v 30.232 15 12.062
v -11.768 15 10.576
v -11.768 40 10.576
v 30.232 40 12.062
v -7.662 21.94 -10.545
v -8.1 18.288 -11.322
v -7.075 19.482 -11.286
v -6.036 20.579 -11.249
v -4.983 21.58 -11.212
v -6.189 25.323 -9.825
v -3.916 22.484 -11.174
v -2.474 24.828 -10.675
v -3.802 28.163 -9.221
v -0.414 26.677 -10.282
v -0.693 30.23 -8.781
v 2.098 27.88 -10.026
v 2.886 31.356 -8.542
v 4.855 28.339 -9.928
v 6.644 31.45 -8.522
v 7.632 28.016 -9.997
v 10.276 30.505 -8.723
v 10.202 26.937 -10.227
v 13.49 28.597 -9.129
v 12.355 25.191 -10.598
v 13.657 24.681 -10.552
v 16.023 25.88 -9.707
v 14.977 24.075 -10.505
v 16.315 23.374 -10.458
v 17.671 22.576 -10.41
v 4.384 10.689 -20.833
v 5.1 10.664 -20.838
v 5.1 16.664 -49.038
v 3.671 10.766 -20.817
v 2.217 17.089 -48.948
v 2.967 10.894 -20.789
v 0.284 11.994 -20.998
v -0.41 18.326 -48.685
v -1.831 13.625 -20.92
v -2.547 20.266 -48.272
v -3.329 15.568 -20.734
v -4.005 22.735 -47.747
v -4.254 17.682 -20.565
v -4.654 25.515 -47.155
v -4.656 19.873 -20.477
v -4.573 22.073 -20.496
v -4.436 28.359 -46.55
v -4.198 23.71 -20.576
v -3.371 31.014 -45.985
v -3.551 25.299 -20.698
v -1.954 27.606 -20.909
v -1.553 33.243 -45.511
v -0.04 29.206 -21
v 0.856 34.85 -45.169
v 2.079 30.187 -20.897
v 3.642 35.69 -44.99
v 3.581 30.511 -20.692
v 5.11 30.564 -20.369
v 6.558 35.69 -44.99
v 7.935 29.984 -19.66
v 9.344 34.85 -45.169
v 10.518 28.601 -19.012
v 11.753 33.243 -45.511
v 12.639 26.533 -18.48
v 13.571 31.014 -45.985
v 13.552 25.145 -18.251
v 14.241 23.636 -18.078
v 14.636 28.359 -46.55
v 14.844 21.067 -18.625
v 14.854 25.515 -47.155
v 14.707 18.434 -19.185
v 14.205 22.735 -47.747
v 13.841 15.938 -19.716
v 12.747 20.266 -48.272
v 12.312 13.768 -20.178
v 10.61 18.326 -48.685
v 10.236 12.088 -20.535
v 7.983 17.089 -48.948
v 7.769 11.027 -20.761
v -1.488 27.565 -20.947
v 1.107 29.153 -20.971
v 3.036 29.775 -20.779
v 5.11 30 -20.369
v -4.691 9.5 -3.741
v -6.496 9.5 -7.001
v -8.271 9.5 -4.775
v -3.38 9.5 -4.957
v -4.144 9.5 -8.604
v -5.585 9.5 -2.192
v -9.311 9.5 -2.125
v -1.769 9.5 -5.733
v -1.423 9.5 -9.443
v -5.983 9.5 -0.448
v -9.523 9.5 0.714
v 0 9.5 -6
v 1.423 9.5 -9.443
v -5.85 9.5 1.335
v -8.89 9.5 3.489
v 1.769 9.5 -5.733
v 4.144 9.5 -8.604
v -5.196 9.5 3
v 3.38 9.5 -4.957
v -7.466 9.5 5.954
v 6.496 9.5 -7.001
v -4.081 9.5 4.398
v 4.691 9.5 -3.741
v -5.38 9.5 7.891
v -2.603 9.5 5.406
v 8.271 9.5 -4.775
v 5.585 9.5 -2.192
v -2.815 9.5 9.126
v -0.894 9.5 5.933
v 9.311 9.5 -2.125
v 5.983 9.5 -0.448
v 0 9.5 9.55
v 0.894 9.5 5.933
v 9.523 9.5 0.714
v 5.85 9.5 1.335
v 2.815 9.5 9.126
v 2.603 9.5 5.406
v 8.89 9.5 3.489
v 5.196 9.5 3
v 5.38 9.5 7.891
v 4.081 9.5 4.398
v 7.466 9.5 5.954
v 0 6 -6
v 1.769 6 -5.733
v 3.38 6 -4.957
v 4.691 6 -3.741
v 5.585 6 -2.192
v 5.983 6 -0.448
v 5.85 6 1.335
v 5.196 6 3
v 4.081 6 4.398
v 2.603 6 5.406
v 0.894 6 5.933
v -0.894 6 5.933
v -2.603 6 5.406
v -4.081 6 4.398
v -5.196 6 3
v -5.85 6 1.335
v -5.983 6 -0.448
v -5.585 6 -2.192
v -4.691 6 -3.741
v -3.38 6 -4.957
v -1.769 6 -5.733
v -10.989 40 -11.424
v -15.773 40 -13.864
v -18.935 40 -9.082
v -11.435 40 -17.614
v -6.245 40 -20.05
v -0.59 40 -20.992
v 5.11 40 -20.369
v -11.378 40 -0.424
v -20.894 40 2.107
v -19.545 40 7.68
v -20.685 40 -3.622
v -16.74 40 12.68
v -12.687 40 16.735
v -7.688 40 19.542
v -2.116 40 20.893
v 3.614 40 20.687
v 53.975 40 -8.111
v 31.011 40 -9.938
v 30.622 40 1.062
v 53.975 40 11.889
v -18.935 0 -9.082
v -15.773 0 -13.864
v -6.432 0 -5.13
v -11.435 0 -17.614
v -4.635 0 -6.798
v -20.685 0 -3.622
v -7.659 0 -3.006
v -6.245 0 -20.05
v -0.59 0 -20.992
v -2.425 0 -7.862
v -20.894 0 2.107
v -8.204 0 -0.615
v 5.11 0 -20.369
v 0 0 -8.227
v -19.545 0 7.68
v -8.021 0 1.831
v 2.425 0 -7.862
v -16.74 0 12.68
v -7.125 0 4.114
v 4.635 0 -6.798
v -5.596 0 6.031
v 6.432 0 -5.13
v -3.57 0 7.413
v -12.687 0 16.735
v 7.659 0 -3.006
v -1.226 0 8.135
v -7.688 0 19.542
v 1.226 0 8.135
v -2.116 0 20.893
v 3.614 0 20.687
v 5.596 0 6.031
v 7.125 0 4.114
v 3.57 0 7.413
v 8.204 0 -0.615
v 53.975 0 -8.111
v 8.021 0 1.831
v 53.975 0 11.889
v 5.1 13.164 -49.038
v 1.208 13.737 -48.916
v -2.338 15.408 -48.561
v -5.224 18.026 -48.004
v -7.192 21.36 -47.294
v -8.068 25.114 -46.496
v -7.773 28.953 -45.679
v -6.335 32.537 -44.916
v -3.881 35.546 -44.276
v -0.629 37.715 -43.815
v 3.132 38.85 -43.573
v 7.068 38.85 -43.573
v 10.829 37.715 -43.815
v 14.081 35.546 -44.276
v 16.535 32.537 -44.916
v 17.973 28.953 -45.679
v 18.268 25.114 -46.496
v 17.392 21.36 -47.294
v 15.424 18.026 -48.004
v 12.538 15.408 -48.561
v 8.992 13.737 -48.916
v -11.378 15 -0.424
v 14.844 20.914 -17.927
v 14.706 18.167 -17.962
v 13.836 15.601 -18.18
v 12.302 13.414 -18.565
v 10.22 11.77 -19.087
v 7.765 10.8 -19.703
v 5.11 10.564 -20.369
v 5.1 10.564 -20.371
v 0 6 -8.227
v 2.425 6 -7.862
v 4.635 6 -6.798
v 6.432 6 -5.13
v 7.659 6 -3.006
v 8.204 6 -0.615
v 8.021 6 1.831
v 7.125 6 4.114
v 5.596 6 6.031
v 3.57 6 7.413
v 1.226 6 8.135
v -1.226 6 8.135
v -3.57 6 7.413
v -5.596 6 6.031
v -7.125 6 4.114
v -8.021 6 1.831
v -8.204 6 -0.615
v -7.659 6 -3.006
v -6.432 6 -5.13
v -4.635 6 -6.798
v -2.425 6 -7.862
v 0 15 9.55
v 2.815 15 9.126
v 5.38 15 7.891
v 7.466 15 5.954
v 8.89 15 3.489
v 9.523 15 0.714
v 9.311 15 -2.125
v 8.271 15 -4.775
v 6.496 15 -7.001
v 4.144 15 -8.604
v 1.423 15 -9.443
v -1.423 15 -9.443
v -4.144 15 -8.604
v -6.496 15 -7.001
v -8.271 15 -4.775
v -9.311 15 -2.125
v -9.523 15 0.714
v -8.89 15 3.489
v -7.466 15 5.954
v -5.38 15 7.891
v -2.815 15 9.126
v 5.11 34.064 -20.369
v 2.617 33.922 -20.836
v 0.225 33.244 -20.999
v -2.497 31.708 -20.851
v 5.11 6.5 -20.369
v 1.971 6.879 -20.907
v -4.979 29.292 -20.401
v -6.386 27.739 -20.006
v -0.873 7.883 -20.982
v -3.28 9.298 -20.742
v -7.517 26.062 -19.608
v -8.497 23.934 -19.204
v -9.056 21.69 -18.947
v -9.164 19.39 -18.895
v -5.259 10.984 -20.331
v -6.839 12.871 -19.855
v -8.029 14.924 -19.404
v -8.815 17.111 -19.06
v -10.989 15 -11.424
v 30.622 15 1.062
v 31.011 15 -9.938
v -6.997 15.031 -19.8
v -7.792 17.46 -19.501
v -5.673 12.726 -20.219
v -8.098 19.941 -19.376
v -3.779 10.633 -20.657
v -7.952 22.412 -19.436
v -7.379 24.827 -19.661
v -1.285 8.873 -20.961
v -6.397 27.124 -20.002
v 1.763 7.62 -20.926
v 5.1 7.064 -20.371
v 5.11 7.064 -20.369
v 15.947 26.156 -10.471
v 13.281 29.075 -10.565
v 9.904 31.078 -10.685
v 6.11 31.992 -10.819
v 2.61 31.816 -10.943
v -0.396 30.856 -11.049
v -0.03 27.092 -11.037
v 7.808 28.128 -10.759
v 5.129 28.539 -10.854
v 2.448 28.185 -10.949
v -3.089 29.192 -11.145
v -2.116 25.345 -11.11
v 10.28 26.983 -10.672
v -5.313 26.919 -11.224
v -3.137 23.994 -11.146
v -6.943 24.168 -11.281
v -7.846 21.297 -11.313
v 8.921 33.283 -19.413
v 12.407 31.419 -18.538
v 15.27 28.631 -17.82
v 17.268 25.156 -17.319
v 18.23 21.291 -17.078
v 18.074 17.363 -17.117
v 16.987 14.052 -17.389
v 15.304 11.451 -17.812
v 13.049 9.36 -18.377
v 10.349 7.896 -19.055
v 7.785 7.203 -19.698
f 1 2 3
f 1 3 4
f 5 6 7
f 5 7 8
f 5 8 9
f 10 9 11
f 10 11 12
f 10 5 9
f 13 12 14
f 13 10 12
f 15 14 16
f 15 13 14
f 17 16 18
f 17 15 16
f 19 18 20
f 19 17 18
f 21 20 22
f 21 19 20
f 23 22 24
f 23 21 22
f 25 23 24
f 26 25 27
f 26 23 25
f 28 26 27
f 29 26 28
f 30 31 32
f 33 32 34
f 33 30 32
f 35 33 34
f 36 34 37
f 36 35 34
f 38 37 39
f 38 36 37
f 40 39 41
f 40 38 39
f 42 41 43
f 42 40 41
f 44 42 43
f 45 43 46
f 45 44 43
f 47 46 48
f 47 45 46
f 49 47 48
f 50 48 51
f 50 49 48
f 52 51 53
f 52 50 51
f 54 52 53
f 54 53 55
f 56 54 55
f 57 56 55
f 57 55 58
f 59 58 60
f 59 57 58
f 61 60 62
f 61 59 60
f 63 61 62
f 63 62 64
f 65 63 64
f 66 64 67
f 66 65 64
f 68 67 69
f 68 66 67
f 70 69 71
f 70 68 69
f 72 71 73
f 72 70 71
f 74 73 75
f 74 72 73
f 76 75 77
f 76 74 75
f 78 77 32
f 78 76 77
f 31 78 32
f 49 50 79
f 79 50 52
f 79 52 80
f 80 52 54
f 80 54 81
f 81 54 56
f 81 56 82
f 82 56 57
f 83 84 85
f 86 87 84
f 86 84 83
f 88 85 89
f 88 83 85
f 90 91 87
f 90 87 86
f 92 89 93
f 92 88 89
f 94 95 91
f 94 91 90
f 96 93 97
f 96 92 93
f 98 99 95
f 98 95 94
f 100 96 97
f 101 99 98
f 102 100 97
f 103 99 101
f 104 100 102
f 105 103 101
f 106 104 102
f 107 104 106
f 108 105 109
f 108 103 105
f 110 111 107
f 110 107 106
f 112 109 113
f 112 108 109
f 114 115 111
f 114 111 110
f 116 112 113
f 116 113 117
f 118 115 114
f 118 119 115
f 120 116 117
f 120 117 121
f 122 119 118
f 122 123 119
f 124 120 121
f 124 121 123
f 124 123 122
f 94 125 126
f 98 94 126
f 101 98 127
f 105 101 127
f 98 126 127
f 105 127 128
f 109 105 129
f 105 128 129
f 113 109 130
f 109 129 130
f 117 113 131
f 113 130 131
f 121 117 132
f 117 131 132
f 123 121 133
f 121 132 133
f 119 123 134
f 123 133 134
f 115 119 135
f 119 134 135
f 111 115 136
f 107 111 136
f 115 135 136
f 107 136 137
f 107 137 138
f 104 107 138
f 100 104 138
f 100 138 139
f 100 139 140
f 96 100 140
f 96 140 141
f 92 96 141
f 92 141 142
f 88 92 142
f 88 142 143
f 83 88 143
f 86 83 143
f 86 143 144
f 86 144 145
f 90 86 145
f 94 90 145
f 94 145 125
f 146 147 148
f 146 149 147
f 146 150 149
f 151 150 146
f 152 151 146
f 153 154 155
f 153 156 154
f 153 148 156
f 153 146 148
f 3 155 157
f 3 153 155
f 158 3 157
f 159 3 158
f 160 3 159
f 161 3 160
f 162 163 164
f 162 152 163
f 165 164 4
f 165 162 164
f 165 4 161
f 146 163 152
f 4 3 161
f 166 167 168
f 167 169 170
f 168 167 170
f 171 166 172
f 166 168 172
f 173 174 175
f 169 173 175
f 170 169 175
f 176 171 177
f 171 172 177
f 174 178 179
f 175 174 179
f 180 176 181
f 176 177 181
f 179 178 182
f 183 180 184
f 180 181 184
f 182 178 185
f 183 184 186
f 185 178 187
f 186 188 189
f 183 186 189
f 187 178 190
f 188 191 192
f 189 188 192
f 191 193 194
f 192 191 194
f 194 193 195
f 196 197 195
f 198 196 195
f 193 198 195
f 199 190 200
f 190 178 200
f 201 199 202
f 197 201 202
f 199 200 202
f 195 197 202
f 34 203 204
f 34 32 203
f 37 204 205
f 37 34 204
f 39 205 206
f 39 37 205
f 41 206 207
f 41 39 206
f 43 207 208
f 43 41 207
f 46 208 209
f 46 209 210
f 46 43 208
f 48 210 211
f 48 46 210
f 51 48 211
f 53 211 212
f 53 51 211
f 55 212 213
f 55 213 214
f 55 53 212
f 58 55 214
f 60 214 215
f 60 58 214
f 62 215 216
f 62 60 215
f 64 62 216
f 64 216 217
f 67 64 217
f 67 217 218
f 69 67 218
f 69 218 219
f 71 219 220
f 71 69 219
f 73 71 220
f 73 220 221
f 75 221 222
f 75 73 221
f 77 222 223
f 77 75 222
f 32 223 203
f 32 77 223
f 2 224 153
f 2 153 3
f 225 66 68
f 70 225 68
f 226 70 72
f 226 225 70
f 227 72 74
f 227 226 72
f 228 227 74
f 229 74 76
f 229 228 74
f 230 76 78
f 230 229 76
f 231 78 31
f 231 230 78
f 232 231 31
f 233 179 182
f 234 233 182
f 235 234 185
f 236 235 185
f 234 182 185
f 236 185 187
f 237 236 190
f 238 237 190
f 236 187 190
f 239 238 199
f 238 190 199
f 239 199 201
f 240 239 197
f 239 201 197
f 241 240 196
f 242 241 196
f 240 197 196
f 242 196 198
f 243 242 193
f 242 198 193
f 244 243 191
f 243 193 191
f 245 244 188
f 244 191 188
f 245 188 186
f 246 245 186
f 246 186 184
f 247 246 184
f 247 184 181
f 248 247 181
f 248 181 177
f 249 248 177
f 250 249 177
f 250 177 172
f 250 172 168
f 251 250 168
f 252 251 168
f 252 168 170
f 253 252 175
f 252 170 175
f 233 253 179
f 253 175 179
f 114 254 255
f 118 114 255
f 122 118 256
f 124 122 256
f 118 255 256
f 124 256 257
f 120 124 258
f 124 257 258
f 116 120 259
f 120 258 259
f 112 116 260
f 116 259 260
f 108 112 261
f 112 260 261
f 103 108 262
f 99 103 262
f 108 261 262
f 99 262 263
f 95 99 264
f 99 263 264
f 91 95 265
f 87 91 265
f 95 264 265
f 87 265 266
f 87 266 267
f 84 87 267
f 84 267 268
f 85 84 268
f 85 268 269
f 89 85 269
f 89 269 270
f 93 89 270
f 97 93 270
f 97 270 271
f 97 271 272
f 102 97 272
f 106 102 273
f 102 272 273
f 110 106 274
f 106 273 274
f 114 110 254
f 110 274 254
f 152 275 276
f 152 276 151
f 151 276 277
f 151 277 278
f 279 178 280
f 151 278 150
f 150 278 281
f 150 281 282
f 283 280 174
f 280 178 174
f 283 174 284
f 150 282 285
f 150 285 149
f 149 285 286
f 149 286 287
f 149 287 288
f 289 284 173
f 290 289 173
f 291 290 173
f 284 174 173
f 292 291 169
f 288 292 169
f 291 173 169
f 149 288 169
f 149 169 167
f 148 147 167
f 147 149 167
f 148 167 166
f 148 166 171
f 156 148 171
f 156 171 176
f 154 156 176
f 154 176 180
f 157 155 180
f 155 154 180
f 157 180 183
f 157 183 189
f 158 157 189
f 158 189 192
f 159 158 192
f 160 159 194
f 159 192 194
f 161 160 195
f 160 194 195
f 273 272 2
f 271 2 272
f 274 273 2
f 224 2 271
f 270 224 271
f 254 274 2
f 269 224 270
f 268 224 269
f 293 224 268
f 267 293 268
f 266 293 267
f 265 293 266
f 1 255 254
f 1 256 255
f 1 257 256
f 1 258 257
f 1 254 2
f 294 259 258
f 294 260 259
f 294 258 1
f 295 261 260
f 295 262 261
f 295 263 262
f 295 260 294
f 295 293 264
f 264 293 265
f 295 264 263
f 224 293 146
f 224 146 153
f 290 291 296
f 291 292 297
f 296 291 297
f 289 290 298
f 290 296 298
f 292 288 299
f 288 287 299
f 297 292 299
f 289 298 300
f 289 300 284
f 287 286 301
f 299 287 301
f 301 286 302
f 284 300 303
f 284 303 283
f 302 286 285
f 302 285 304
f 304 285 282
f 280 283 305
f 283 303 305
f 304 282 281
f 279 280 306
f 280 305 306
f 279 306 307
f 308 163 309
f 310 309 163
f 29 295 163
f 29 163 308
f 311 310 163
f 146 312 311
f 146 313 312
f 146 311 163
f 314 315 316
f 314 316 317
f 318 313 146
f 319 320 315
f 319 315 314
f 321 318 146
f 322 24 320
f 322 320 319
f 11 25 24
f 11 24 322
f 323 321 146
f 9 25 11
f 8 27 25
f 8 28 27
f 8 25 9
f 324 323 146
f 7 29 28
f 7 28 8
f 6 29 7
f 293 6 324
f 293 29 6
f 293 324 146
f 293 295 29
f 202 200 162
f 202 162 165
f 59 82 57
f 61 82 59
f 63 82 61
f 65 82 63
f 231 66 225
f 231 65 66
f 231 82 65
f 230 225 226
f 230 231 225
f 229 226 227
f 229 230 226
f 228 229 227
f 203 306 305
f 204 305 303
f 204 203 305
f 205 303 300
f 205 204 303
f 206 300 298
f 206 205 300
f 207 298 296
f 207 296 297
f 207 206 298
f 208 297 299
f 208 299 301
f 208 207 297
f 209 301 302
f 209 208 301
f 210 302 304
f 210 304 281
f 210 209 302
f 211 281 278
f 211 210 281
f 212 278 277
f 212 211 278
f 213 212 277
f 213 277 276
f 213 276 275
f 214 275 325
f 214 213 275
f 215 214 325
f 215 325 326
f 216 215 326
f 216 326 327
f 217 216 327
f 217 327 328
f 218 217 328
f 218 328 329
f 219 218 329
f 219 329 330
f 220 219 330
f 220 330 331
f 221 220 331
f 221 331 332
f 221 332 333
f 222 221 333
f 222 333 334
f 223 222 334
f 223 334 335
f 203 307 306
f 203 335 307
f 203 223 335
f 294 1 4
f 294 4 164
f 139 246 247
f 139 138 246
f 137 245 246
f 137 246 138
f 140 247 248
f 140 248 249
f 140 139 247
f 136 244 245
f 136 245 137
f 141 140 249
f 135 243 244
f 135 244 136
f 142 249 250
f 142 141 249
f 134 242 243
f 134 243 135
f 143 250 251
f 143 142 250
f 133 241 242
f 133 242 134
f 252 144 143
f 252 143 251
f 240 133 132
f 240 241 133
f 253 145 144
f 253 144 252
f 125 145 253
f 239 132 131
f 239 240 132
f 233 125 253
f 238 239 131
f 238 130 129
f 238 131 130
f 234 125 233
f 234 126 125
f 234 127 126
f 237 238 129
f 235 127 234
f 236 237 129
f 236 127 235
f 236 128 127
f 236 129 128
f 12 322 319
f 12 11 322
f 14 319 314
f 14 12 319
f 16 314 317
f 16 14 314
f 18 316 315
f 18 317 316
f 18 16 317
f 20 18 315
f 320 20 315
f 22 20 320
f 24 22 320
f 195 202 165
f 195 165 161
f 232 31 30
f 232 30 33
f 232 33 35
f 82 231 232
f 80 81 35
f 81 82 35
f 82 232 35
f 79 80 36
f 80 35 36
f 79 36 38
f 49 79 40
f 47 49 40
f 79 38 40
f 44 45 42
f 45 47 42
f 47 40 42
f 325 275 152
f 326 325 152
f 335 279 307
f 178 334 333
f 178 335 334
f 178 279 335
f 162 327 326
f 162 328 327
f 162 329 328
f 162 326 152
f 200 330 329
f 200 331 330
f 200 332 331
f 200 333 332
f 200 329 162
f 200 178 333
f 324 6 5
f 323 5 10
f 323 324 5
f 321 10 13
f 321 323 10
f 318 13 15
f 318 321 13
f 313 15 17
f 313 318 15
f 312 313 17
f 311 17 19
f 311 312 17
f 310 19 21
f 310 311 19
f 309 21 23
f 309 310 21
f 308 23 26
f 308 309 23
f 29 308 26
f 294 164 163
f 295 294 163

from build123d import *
from build123d.topology import SkipClean

# Parameters (mm, degrees)
CROQUIS1_R              = 21
SALIENTE_EXTRUIR1_DEPTH = 40
SALIENTE_EXTRUIR2_DEPTH = 40
SALIENTE_EXTRUIR3_REACH = 77.493
CROQUIS3_R              = 13.5
CROQUIS3_R_2            = 10
CROQUIS7_R              = 8.227269221
CROQUIS7_R_2            = 6
CORTAR_EXTRUIR6_DEPTH   = 6
CROQUIS8_R              = 6
CORTAR_EXTRUIR7_DEPTH   = 72.223648425
CORTAR_EXTRUIR8_START   = -25
CORTAR_EXTRUIR8_DEPTH   = 25
CROQUIS12_R             = 9.55
CORTAR_EXTRUIR9_DEPTH   = 5.5
CORTAR_EXTRUIR10_DEPTH  = 72.223648425


with BuildPart() as part:
    # Croquis1 → Saliente-Extruir1 (new body)
    with BuildSketch(Plane(origin=(0, 0, 0), x_dir=(1, 0, 0), z_dir=(0, 1, 0))):
        with Locations(Location((0, 0, 0), (0, 0, 270))):
            Circle(CROQUIS1_R)
    extrude(amount=SALIENTE_EXTRUIR1_DEPTH)

    # Croquis2 → Saliente-Extruir2 (add)
    with BuildSketch(Plane(origin=(0, 0, 0), x_dir=(1, 0, 0), z_dir=(0, 1, 0))):
        with BuildLine():
            Line((53.975127576, 8.110971331), (53.975127576, -11.889028669))
            Line((53.975127576, -11.889028669), (3.613793412, -20.686722727))
            ThreePointArc((3.613793412, -20.686722727), (20.98607707, -0.764571273), (5.109545014, 20.368911354))
            Line((5.109545014, 20.368911354), (53.975127576, 8.110971331))
        make_face()
    extrude(amount=SALIENTE_EXTRUIR2_DEPTH)

    # Croquis3 → Saliente-Extruir3 (add, up to next)
    with BuildSketch(Plane(origin=(5.109545014, 0, -20.368911354), x_dir=(-0.9699481597219111, 0, -0.24331166731597212), z_dir=(0.2433116673159721, 0, -0.969948159721911)), mode=Mode.PRIVATE) as saliente_extruir3_sk1:
        with Locations((0, 20)):
            Circle(CROQUIS3_R)
        with Locations((0, 20)):
            Circle(CROQUIS3_R_2, mode=Mode.SUBTRACT)
    saliente_extruir3_tool1 = extrude(saliente_extruir3_sk1.sketch, amount=-SALIENTE_EXTRUIR3_REACH, mode=Mode.PRIVATE) - part.part
    add(saliente_extruir3_tool1.solids().sort_by_distance((17.833482, 20, -17.177109))[0])

    # Croquis7 → Cortar-Extruir6 (cut)
    with BuildSketch(Plane.XZ):
        with Locations(Location((0, 0, 0), (0, 0, 270))):
            Circle(CROQUIS7_R)
        with Locations(Location((0, 0, 0), (0, 0, 270))):
            Circle(CROQUIS7_R_2, mode=Mode.SUBTRACT)
    extrude(amount=-CORTAR_EXTRUIR6_DEPTH, mode=Mode.SUBTRACT)

    # Croquis8 → Cortar-Extruir7 (cut, through all)
    with BuildSketch(Plane.XZ):
        with Locations(Location((0, 0, 0), (0, 0, 270))):
            Circle(CROQUIS8_R)
    extrude(amount=-CORTAR_EXTRUIR7_DEPTH, mode=Mode.SUBTRACT)

    # Croquis10 → Cortar-Extruir8 (cut)
    with BuildSketch(Plane(origin=(0, 40, 0), x_dir=(1, 0, 0), z_dir=(0, 1, 0)).offset(CORTAR_EXTRUIR8_START)):
        with BuildLine():
            Line((-5.995438853, 0.23390802), (-11.37823559, 0.424457107))
            Line((-11.37823559, 0.424457107), (-11.767631672, -10.575542893))
            Line((-11.767631672, -10.575542893), (30.232368328, -12.062327932))
            Line((30.232368328, -12.062327932), (30.62176441, -1.062327932))
            Line((30.62176441, -1.062327932), (5.996971268, -0.190619027))
            ThreePointArc((5.996971268, -0.190619027), (-0.212264906, -5.996244125), (-5.995438853, 0.23390802))
        make_face()
        with BuildLine():
            Line((-10.988839509, 11.424457107), (-11.37823559, 0.424457107))
            Line((-11.37823559, 0.424457107), (-5.995438853, 0.23390802))
            ThreePointArc((-5.995438853, 0.23390802), (0.116976243, 5.998859605), (6, 0))
            ThreePointArc((6, 0), (5.999242769, -0.095321543), (5.996971268, -0.190619027))
            Line((5.996971268, -0.190619027), (30.62176441, -1.062327932))
            Line((30.62176441, -1.062327932), (31.011160491, 9.937672068))
            Line((31.011160491, 9.937672068), (-10.988839509, 11.424457107))
        make_face()
    extrude(amount=CORTAR_EXTRUIR8_DEPTH, mode=Mode.SUBTRACT)

    # Croquis12 → Cortar-Extruir9 (cut)
    with BuildSketch(Plane(origin=(0, 15, 0), x_dir=(1, 0, 0), z_dir=(0, 1, 0))):
        with Locations(Location((0, 0, 0), (0, 0, 270))):
            Circle(CROQUIS12_R)
    extrude(amount=-CORTAR_EXTRUIR9_DEPTH, mode=Mode.SUBTRACT)

    # Croquis17 → Cortar-Extruir10 (cut, through all)
    with BuildSketch(Plane(origin=(0, 40, 0), x_dir=(1, 0, 0), z_dir=(0, 1, 0))):
        with BuildLine():
            Line((5.109545014, 20.368911354), (5.109545014, 31.680559043))
            Line((5.109545014, 31.680559043), (-13.688349404, 31.680559043))
            Line((-13.688349404, 31.680559043), (-13.688349404, 15.925736736))
            ThreePointArc((-13.688349404, 15.925736736), (-4.830571536, 20.436868122), (5.109545014, 20.368911354))
        make_face()
    extrude(amount=-CORTAR_EXTRUIR10_DEPTH, mode=Mode.SUBTRACT)

    # Croquis4 → Revolución1 (revolve)
    with SkipClean():  # the faces are left unmerged after this step: merging them gives an invalid solid
        with BuildSketch(Plane(origin=(5.1, 0, 0), x_dir=(0, 0, -1), z_dir=(1, 0, 0))):
            Polygon((13.998733147, 5.708275528), (49.038401492, 13.163524112), (49.038401492, 16.663524112), (20.838401492, 10.663524112), (13.998733147, 9.208275528), align=None)
        revolve(axis=Axis((5.1, 20.663524112, -20.838401492), (0, 0.20810764446485977, -0.9781059289848353)))


solid = part.part
